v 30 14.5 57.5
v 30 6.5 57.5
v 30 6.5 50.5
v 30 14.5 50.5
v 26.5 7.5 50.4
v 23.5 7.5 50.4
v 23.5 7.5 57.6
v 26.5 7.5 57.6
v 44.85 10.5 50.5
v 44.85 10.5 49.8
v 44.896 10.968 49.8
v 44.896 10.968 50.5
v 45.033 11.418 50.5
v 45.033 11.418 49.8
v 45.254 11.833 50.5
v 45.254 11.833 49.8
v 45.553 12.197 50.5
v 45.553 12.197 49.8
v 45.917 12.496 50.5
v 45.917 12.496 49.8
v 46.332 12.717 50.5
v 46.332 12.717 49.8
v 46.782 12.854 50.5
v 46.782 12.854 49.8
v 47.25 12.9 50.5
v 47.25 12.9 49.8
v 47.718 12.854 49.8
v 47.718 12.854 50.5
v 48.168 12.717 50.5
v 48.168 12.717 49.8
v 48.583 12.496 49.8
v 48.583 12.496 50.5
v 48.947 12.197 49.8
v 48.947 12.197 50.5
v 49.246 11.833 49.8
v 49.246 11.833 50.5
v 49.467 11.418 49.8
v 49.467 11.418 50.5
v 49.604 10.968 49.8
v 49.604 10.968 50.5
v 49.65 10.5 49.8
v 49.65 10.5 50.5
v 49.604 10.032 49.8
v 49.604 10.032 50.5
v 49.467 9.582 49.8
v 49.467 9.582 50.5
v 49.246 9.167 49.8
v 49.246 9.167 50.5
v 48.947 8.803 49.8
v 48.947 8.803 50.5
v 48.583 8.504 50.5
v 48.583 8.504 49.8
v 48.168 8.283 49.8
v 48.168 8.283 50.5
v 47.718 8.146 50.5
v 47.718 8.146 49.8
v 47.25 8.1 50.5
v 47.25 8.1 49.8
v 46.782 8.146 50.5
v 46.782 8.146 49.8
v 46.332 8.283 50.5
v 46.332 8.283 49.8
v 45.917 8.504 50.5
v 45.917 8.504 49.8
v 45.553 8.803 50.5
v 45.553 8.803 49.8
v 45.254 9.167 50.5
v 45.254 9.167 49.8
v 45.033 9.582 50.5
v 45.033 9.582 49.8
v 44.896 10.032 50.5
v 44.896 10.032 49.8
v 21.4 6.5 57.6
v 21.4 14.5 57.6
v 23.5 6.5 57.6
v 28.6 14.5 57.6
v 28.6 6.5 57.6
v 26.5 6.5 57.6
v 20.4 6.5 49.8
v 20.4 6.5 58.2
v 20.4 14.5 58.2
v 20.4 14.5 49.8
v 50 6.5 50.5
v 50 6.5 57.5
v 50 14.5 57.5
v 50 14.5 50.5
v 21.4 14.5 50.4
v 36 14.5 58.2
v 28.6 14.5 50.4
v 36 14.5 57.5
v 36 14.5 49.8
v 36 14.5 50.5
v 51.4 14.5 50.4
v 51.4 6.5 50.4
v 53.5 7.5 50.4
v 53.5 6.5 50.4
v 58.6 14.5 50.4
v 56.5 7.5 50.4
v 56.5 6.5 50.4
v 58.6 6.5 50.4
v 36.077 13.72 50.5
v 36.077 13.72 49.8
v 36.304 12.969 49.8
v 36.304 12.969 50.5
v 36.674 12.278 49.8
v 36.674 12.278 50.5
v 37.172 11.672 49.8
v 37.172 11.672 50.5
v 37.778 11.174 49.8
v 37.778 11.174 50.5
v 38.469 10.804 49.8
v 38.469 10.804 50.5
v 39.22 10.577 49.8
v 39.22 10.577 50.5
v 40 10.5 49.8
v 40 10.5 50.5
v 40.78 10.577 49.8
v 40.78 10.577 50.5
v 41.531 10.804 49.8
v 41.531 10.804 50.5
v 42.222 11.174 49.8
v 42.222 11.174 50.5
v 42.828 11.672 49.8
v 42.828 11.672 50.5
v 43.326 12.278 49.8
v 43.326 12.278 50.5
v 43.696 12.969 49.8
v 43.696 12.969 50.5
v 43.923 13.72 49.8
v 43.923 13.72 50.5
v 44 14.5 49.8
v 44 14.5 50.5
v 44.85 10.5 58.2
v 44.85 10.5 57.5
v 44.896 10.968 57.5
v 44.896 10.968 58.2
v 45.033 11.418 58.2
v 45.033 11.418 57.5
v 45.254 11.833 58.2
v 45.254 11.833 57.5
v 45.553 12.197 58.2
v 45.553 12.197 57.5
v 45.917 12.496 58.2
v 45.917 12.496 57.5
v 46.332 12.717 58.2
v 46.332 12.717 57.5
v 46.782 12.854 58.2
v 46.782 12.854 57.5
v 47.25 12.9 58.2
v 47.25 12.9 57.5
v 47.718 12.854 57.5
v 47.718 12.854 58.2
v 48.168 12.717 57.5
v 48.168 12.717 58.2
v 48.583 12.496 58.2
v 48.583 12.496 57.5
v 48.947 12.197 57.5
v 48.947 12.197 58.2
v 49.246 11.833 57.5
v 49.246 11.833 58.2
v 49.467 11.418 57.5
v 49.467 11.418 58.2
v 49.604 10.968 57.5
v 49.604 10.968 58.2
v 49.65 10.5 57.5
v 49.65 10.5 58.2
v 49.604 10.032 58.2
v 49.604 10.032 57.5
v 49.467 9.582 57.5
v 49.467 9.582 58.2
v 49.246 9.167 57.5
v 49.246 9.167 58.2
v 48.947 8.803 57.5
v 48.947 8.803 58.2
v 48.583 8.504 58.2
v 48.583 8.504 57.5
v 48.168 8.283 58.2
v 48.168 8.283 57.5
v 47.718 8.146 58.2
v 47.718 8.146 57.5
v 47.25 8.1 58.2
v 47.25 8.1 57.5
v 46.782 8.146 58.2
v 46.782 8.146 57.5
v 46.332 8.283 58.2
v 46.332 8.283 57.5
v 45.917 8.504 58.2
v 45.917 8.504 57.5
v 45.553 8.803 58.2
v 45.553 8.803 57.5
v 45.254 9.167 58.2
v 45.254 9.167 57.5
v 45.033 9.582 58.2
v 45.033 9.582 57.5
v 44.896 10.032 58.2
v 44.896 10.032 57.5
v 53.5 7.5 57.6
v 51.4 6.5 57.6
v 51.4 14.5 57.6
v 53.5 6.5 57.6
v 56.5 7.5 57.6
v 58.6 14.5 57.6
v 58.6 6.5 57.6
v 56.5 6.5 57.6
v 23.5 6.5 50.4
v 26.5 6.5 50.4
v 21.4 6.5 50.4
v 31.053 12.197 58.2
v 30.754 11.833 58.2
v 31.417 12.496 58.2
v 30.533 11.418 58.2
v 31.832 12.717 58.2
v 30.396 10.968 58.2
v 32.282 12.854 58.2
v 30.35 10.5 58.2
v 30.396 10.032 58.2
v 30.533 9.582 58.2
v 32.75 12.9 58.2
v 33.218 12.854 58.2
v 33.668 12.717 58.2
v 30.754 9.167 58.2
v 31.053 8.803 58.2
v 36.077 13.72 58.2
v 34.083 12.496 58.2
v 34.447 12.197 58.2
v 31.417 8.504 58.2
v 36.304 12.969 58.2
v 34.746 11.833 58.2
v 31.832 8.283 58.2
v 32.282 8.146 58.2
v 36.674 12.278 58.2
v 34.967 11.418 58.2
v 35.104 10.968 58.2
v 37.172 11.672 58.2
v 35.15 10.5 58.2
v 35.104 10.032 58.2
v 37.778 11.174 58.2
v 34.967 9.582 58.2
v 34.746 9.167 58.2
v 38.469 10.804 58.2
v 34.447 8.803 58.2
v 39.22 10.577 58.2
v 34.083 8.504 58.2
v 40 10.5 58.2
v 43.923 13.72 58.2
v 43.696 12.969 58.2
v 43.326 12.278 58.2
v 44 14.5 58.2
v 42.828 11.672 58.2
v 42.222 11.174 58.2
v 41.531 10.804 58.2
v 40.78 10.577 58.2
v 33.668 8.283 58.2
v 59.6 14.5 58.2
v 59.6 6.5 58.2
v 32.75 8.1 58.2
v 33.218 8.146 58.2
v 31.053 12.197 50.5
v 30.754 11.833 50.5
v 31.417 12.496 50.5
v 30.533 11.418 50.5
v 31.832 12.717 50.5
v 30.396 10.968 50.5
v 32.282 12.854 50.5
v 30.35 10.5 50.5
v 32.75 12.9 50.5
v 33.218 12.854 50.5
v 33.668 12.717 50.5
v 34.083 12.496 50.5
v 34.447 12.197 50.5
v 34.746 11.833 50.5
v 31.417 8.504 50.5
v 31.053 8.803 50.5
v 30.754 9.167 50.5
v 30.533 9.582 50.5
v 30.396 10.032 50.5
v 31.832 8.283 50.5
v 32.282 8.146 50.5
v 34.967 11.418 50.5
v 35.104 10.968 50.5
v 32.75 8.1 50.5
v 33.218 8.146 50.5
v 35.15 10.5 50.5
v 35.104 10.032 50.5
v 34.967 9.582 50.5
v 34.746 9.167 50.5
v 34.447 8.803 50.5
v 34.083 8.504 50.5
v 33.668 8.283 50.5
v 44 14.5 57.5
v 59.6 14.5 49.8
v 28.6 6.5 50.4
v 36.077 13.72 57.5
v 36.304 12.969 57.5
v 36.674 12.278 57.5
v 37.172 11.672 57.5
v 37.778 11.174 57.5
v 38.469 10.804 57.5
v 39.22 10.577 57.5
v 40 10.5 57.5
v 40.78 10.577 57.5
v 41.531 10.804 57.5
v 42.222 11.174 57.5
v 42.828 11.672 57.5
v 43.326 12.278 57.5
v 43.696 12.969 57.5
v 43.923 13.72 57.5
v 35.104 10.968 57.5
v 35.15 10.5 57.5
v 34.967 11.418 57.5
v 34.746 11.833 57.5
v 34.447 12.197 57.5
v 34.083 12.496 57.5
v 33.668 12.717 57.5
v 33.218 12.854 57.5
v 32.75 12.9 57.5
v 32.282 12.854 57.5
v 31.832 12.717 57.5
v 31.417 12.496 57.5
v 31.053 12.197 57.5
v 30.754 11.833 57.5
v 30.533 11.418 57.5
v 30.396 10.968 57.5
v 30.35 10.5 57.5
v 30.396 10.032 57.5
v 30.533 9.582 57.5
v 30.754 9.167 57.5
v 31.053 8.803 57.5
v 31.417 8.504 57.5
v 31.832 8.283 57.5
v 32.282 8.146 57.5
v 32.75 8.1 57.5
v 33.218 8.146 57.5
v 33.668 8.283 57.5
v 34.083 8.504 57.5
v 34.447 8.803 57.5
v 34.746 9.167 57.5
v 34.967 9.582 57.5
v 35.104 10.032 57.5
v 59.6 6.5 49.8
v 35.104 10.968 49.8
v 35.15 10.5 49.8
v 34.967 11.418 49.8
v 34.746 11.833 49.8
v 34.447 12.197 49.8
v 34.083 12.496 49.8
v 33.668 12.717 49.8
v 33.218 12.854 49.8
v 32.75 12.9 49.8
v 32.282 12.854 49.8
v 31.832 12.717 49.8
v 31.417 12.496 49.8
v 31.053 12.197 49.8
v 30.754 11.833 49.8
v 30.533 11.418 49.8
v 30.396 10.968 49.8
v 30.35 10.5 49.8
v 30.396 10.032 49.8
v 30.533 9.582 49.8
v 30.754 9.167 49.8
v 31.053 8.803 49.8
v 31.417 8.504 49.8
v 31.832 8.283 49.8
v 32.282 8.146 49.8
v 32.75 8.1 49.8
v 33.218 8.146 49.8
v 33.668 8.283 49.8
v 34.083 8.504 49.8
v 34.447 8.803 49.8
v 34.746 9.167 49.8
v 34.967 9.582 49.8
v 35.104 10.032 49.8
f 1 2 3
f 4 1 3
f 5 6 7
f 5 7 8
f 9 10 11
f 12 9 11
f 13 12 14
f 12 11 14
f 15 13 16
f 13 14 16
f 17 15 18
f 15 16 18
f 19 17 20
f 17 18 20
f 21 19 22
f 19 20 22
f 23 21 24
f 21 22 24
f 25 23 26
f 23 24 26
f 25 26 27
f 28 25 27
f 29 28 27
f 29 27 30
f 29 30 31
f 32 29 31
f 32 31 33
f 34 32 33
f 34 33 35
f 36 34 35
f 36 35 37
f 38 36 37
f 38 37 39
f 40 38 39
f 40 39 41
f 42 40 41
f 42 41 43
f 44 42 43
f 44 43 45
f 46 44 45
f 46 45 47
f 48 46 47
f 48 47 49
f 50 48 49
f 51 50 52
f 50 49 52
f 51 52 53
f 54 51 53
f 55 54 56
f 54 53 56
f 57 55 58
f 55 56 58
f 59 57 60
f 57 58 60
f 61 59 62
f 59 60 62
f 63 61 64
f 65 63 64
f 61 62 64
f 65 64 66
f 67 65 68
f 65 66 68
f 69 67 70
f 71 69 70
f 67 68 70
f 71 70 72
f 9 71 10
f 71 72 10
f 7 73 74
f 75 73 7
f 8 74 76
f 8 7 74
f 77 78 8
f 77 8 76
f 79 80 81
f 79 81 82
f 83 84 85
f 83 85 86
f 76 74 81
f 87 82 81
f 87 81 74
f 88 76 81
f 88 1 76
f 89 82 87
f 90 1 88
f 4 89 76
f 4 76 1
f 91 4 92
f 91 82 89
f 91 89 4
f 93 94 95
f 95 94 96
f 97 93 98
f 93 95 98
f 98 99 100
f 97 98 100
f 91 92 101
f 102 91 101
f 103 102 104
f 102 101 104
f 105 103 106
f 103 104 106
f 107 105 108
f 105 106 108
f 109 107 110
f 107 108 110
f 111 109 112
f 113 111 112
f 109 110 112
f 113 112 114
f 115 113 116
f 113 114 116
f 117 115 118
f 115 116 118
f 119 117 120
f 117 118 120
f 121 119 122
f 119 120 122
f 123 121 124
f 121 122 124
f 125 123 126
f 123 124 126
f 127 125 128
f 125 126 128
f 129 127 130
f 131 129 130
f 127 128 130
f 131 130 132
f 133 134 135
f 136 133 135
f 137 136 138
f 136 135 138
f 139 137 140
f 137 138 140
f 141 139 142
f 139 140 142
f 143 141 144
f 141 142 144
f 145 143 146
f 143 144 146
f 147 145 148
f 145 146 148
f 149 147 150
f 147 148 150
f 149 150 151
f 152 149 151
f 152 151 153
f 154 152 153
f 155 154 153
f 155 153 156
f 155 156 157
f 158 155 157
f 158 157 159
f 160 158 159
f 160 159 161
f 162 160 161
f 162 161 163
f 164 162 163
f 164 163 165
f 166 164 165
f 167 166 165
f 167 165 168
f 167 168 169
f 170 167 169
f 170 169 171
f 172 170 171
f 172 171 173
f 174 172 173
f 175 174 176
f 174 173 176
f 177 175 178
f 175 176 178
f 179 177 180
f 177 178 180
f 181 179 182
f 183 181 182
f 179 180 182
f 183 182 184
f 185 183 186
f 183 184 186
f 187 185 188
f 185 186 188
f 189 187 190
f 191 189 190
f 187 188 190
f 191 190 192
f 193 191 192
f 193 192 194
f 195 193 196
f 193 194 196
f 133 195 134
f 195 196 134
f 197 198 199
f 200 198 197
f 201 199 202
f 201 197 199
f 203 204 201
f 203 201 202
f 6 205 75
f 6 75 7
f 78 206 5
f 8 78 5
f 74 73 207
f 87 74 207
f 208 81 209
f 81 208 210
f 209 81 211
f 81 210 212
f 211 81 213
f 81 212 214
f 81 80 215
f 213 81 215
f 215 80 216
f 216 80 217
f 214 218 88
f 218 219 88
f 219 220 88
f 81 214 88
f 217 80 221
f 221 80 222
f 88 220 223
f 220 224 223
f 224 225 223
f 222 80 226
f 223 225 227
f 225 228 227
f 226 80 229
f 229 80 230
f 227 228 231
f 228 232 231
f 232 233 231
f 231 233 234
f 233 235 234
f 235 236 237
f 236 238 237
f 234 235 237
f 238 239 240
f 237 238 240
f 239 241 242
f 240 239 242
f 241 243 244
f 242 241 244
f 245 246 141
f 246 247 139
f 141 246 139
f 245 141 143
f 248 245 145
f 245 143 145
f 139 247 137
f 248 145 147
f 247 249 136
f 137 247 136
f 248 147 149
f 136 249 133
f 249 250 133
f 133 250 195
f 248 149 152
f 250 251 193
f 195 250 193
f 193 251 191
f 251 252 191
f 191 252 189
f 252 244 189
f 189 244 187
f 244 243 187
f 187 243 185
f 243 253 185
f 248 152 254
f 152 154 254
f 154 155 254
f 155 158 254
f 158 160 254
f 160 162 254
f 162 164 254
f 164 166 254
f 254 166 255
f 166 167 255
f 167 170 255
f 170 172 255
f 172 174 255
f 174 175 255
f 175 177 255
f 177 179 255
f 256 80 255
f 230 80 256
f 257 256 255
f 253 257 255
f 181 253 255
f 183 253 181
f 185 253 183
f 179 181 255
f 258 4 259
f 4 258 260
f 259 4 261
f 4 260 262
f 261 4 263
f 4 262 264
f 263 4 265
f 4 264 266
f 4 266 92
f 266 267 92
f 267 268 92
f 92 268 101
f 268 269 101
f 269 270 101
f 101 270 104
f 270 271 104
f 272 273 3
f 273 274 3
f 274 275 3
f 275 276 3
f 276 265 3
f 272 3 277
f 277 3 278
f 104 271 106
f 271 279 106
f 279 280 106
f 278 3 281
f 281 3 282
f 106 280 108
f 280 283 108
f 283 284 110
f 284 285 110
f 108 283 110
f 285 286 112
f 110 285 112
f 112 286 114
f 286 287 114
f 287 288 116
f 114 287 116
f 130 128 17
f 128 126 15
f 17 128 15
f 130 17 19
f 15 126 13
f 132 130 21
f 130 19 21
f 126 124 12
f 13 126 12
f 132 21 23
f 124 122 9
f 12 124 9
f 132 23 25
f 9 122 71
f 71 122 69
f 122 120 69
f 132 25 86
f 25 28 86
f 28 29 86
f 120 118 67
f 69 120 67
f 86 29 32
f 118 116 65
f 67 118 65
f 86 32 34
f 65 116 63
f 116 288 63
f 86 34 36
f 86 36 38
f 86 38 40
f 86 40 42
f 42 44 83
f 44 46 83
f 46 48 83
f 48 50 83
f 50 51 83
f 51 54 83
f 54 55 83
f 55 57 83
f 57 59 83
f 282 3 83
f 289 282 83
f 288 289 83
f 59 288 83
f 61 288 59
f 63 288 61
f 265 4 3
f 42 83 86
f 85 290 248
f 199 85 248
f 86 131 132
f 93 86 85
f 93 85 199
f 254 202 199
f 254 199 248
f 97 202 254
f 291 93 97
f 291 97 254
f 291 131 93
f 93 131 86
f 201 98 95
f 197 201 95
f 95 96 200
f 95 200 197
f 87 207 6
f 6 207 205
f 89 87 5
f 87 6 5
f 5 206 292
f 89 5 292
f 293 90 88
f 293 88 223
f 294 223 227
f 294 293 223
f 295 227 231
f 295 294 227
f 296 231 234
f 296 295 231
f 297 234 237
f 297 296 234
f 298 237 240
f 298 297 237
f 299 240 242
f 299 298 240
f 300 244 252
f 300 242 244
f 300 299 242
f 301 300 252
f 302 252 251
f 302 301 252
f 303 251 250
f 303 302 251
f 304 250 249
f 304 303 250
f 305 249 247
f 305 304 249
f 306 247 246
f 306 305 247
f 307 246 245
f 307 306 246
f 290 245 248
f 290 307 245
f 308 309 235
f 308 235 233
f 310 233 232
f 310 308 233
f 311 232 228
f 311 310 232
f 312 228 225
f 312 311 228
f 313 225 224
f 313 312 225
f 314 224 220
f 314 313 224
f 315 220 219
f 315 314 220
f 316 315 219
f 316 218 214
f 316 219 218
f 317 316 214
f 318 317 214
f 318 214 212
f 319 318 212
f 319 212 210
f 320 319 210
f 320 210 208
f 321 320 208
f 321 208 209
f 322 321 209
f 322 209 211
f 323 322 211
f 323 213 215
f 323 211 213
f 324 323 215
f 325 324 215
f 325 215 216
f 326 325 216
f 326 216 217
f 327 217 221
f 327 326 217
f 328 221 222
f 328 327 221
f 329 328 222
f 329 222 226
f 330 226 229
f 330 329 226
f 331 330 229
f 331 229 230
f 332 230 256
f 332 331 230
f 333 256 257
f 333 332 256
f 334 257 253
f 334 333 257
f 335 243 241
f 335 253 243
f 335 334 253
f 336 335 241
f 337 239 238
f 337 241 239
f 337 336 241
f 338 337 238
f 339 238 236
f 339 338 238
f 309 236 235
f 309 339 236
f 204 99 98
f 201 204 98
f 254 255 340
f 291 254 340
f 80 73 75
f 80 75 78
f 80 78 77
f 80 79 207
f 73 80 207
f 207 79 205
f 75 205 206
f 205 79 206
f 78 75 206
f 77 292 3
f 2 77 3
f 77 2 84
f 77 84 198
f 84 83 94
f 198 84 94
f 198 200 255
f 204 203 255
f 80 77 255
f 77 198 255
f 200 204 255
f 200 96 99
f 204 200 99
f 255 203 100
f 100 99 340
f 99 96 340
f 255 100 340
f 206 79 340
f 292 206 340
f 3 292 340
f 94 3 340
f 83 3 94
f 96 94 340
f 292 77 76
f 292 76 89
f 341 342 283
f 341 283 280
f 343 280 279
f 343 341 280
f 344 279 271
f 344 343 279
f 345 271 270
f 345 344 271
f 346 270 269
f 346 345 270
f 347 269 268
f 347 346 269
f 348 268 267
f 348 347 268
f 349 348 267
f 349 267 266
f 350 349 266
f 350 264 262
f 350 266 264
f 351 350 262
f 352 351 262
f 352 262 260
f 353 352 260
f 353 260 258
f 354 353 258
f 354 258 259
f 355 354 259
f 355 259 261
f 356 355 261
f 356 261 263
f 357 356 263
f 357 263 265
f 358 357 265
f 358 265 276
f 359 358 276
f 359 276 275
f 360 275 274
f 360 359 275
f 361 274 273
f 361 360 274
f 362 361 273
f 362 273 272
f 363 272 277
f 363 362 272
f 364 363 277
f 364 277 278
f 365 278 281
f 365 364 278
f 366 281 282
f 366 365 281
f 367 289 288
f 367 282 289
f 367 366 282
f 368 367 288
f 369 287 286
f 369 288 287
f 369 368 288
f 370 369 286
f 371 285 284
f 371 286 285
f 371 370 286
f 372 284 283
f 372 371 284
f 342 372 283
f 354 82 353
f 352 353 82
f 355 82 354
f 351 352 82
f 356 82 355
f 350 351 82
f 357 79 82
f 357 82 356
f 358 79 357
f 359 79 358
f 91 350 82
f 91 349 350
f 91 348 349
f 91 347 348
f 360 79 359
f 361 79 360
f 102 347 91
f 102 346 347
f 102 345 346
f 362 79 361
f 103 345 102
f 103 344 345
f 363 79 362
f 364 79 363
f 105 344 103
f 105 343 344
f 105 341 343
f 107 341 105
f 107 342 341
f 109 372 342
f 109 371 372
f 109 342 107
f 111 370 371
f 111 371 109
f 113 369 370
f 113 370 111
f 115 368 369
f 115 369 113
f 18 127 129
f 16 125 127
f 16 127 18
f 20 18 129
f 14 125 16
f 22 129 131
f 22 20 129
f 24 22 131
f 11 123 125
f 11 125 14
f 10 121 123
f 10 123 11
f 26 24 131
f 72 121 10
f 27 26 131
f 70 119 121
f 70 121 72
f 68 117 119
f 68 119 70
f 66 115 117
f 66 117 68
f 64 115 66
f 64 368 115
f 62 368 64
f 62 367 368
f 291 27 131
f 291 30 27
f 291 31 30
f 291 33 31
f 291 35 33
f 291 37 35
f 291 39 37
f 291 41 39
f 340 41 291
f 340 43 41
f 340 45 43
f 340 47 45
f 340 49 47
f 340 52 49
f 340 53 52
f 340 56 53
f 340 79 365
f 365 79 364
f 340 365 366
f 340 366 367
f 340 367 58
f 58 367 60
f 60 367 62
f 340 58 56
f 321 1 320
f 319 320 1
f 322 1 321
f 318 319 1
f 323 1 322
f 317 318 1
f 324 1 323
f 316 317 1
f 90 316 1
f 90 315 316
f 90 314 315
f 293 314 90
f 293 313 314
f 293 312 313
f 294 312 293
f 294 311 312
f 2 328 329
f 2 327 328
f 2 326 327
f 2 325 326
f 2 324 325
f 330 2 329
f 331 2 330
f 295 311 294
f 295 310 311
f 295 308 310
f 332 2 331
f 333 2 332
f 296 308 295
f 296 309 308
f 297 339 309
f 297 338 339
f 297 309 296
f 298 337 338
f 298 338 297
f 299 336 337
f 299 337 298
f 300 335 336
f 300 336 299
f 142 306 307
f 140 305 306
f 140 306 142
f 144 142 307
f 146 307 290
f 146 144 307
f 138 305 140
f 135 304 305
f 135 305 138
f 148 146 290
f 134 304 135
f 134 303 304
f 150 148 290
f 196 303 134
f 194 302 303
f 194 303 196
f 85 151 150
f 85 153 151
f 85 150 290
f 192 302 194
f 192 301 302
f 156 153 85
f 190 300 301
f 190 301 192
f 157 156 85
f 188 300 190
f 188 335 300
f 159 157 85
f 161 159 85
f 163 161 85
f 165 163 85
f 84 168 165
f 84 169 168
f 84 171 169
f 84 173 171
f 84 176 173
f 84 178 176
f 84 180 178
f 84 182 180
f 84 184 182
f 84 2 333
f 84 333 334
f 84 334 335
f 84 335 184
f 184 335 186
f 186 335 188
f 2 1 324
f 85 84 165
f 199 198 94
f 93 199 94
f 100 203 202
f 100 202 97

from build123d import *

# Parameters (mm, degrees)
SKETCH099_W             = 39.2
SKETCH099_H             = 8.4
SKETCH099_W_2           = 7.2
SKETCH099_H_2           = 7.2
SKETCH099_W_3           = 20
SKETCH099_H_3           = 7
PAD061_DEPTH            = 8
CYLINDER082_R           = 4
CYLINDER082_DEPTH       = 5
BOX007_W                = 3
BOX007_H                = 1
BOX007_DEPTH            = 8
CYLINDER083_R           = 2.4
CYLINDER083_DEPTH       = 10
BODY094_PLACEMENT_ANGLE = 90


with BuildPart() as part:
    # Sketch099 → Pad061 (new body)
    with BuildSketch(Plane.XY):
        Rectangle(SKETCH099_W, SKETCH099_H)
        with Locations((-15, 0)):
            Rectangle(SKETCH099_W_2, SKETCH099_H_2, mode=Mode.SUBTRACT)
        with Locations((15, 0)):
            Rectangle(SKETCH099_W_2, SKETCH099_H_2, mode=Mode.SUBTRACT)
        Rectangle(SKETCH099_W_3, SKETCH099_H_3, mode=Mode.SUBTRACT)
    extrude(amount=PAD061_DEPTH)

    # Cylinder082 → Cylinder082 (cut)
    with BuildSketch(Plane(origin=(0, 0, 8), x_dir=(1, 0, 0), z_dir=(0, -1, 0))):
        Circle(CYLINDER082_R)
    cylinder082 = extrude(amount=CYLINDER082_DEPTH, mode=Mode.SUBTRACT)

    # Mirrored017: Cylinder082 across XZ
    add(cylinder082.mirror(Plane.XZ), mode=Mode.SUBTRACT)

    # Box007 → Box007 (join)
    with BuildSketch(Plane(origin=(-16.5, 4, 0), x_dir=(1, 0, 0), z_dir=(0, -1, 0))):
        with Locations((1.5, 0.5)):
            Rectangle(BOX007_W, BOX007_H)
    box007 = extrude(amount=BOX007_DEPTH)

    # Mirrored018: Box007 across YZ
    add(box007.mirror(Plane.YZ))

    # Cylinder083 → Cylinder083 (cut)
    with BuildSketch(Plane(origin=(-7.25, 5, 4), x_dir=(1, 0, 0), z_dir=(0, -1, 0))):
        Circle(CYLINDER083_R)
    cylinder083 = extrude(amount=CYLINDER083_DEPTH, mode=Mode.SUBTRACT)

    # Mirrored019: Cylinder083 across YZ
    add(cylinder083.mirror(Plane.YZ), mode=Mode.SUBTRACT)


with BuildPart() as part_1:
    # Body088 placement: moved
    add(part.part.moved(Location((0, 0, -10.5))))


with BuildPart() as part_2:
    # Body094 placement: moved
    add(part_1.part.moved(Location((40, 17, 54))).rotate(Axis((40, 17, 54), (-1, 0, 0)), BODY094_PLACEMENT_ANGLE))


solid = part_2.part
